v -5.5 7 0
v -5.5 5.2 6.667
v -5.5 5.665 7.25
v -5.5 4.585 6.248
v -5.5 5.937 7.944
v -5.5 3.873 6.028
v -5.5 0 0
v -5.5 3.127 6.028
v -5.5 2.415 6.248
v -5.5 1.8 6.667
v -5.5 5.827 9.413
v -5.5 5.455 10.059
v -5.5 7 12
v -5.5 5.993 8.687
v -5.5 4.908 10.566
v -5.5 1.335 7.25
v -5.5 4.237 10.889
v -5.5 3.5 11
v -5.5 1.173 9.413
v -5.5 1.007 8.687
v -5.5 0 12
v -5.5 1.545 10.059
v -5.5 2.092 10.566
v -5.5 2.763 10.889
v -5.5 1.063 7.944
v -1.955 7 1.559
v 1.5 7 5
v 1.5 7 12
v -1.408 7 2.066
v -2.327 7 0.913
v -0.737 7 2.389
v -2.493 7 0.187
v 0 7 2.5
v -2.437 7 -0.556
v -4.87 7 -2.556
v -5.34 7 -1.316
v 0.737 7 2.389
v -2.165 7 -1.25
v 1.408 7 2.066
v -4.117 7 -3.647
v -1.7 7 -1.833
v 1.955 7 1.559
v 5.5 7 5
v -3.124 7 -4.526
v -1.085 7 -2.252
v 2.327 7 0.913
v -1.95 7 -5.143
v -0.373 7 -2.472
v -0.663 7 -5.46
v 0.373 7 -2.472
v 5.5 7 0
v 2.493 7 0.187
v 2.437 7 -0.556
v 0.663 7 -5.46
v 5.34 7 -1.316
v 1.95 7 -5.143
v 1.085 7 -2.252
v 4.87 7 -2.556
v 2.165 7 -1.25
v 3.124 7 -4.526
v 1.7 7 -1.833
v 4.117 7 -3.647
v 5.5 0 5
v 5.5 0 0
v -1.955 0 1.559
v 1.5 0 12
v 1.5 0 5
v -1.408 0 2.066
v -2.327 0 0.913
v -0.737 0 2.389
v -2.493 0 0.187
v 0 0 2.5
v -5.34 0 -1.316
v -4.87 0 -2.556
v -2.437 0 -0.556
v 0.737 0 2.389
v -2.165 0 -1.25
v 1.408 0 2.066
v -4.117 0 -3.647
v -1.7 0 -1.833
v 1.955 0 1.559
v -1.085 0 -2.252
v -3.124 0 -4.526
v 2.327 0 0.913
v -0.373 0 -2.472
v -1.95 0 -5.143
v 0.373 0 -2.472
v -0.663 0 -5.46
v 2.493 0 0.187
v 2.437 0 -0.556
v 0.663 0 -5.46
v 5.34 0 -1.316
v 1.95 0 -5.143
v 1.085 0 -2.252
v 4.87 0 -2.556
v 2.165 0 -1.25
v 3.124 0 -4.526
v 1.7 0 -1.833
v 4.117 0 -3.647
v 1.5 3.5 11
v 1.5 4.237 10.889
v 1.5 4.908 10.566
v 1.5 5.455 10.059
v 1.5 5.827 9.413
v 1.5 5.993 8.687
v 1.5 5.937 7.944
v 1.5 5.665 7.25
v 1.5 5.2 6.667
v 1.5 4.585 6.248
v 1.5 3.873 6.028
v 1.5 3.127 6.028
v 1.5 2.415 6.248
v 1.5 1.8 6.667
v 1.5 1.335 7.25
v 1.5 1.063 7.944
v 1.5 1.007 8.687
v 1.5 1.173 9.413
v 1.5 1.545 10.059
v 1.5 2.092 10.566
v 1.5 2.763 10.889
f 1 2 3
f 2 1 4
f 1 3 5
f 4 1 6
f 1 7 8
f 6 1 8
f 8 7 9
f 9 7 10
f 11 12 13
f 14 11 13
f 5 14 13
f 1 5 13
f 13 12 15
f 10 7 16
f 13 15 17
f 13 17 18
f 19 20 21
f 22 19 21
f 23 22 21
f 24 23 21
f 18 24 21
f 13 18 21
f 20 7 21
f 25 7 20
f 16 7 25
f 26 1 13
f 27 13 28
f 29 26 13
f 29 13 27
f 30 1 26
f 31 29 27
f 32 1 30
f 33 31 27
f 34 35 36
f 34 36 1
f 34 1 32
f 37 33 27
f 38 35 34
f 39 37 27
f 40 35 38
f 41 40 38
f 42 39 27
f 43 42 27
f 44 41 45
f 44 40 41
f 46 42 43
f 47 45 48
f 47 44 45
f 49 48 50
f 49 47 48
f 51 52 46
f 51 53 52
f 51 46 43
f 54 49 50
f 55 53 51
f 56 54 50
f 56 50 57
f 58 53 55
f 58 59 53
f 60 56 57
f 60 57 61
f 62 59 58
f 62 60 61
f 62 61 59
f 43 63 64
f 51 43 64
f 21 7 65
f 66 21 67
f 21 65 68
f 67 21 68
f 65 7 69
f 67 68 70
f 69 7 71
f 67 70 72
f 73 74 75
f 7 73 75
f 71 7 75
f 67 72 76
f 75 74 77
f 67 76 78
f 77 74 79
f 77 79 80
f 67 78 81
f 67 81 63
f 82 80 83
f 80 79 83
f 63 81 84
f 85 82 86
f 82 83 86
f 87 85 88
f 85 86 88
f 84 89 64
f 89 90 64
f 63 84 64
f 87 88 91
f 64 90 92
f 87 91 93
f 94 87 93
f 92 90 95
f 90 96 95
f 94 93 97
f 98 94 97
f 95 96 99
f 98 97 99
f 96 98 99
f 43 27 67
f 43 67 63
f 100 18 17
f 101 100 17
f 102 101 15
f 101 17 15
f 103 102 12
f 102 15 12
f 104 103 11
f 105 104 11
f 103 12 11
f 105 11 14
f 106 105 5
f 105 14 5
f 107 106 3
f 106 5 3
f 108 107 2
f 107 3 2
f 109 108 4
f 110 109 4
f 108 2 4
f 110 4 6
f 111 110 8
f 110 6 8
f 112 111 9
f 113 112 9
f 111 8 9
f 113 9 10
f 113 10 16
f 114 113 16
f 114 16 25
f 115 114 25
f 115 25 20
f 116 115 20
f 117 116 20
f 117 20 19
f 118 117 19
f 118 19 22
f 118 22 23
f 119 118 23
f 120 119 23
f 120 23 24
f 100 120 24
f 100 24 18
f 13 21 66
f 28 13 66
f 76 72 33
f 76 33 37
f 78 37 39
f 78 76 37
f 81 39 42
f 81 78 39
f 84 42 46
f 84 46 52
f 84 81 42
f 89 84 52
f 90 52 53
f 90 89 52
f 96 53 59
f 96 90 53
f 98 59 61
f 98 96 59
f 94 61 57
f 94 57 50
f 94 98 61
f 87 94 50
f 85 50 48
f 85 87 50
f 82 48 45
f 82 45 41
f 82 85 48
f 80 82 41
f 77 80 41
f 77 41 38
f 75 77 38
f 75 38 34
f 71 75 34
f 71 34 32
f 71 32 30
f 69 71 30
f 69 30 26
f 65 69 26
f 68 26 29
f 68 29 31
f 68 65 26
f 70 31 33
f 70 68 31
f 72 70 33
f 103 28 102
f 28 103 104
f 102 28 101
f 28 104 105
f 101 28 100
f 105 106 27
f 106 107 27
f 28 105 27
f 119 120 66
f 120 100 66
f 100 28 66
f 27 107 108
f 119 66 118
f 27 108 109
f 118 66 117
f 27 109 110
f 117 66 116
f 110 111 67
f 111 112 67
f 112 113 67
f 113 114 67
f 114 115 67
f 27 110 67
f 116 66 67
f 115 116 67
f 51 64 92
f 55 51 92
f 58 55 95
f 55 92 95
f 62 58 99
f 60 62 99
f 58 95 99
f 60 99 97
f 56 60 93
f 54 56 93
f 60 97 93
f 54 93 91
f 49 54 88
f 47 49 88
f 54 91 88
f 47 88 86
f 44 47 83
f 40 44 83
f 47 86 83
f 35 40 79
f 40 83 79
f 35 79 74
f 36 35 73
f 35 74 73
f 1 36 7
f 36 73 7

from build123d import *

# Parameters (mm, degrees)
CROQUIS1_R              = 2.5
SALIENTE_EXTRUIR1_DEPTH = 7
CROQUIS3_R              = 2.5
CORTAR_EXTRUIR1_DEPTH   = 17


with BuildPart() as part:
    # Croquis1 → Saliente-Extruir1 (new body)
    with BuildSketch(Plane(origin=(0, 0, 0), x_dir=(1, 0, 0), z_dir=(0, 1, 0))):
        with BuildLine():
            Line((-5.5, 0), (-5.5, -12))
            Line((-5.5, -12), (1.5, -12))
            Line((1.5, -12), (1.5, -5))
            Line((1.5, -5), (5.5, -5))
            Line((5.5, -5), (5.5, 0))
            ThreePointArc((5.5, 0), (0, 5.5), (-5.5, 0))
        make_face()
        with Locations(Location((0, 0, 0), (0, 0, 270))):
            Circle(CROQUIS1_R, mode=Mode.SUBTRACT)
    extrude(amount=SALIENTE_EXTRUIR1_DEPTH)

    # Croquis3 → Cortar-Extruir1 (cut)
    with BuildSketch(Plane.ZY.offset(5.5)):
        with Locations((8.5, 3.5)):
            Circle(CROQUIS3_R)
    extrude(amount=-CORTAR_EXTRUIR1_DEPTH, mode=Mode.SUBTRACT)


solid = part.part
